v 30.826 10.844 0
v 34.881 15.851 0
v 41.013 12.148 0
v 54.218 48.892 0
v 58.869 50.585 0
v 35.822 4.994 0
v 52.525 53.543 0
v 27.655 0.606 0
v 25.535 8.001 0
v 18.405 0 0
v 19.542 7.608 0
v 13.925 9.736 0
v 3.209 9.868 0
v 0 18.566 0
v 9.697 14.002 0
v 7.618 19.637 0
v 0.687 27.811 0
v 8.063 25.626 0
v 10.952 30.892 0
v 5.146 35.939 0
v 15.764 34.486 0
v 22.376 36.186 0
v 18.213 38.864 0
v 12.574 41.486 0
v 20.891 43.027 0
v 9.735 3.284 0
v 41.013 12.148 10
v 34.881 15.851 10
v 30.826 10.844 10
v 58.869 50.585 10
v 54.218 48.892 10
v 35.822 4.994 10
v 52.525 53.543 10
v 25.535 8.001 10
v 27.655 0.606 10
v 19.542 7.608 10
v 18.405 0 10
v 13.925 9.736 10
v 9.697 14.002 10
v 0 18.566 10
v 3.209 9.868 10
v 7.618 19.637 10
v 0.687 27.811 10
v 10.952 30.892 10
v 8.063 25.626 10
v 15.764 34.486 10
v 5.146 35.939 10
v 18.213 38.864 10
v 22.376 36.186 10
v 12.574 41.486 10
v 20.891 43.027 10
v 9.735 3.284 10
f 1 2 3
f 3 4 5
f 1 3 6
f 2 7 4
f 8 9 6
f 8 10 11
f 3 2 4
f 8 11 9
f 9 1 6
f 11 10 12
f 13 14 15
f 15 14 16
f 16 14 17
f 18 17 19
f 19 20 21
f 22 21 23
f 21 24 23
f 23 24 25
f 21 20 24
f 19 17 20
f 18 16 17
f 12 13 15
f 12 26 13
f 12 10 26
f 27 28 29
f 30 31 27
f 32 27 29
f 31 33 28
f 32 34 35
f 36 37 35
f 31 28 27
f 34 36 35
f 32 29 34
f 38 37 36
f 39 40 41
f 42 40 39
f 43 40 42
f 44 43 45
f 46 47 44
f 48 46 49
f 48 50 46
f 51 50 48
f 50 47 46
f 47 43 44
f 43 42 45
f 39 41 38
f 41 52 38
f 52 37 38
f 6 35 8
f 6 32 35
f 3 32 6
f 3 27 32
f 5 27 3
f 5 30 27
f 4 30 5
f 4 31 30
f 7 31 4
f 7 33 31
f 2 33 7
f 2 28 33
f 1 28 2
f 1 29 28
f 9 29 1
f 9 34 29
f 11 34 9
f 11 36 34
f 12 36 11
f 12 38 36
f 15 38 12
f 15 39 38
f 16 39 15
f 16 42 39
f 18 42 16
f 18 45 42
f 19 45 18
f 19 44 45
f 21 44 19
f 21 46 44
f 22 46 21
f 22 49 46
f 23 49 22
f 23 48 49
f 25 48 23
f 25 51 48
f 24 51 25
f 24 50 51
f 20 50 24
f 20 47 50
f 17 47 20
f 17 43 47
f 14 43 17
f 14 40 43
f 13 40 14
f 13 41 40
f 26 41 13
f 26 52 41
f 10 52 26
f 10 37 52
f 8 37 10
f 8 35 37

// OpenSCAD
$fn = 32;

// ----------------------------------------------------------------------
// Hook plate: curl radius 18 mm over 245 degrees, 7 mm thick band
// ----------------------------------------------------------------------

// --- parameters (mm) ---
profile_height = 10;      // extrusion height
profile_points = 26;      // points of the closed outline

profile = [[18.213, 38.864], [20.891, 43.027], [12.574, 41.486], [5.146, 35.939], [0.687, 27.811], [0, 18.566], [3.209, 9.868], [9.735, 3.284], [18.405, 0], [27.655, 0.606], [35.822, 4.994], [41.013, 12.148], [58.869, 50.585], [54.218, 48.892], [52.525, 53.543], [34.881, 15.851], [30.826, 10.844], [25.535, 8.001], [19.542, 7.608], [13.925, 9.736], [9.697, 14.002], [7.618, 19.637], [8.063, 25.626], [10.952, 30.892], [15.764, 34.486], [22.376, 36.186]];  // single closed polygon, 26 points, counter clockwise

// --- the one profile operation ---
linear_extrude(height = profile_height) polygon(points = profile);
